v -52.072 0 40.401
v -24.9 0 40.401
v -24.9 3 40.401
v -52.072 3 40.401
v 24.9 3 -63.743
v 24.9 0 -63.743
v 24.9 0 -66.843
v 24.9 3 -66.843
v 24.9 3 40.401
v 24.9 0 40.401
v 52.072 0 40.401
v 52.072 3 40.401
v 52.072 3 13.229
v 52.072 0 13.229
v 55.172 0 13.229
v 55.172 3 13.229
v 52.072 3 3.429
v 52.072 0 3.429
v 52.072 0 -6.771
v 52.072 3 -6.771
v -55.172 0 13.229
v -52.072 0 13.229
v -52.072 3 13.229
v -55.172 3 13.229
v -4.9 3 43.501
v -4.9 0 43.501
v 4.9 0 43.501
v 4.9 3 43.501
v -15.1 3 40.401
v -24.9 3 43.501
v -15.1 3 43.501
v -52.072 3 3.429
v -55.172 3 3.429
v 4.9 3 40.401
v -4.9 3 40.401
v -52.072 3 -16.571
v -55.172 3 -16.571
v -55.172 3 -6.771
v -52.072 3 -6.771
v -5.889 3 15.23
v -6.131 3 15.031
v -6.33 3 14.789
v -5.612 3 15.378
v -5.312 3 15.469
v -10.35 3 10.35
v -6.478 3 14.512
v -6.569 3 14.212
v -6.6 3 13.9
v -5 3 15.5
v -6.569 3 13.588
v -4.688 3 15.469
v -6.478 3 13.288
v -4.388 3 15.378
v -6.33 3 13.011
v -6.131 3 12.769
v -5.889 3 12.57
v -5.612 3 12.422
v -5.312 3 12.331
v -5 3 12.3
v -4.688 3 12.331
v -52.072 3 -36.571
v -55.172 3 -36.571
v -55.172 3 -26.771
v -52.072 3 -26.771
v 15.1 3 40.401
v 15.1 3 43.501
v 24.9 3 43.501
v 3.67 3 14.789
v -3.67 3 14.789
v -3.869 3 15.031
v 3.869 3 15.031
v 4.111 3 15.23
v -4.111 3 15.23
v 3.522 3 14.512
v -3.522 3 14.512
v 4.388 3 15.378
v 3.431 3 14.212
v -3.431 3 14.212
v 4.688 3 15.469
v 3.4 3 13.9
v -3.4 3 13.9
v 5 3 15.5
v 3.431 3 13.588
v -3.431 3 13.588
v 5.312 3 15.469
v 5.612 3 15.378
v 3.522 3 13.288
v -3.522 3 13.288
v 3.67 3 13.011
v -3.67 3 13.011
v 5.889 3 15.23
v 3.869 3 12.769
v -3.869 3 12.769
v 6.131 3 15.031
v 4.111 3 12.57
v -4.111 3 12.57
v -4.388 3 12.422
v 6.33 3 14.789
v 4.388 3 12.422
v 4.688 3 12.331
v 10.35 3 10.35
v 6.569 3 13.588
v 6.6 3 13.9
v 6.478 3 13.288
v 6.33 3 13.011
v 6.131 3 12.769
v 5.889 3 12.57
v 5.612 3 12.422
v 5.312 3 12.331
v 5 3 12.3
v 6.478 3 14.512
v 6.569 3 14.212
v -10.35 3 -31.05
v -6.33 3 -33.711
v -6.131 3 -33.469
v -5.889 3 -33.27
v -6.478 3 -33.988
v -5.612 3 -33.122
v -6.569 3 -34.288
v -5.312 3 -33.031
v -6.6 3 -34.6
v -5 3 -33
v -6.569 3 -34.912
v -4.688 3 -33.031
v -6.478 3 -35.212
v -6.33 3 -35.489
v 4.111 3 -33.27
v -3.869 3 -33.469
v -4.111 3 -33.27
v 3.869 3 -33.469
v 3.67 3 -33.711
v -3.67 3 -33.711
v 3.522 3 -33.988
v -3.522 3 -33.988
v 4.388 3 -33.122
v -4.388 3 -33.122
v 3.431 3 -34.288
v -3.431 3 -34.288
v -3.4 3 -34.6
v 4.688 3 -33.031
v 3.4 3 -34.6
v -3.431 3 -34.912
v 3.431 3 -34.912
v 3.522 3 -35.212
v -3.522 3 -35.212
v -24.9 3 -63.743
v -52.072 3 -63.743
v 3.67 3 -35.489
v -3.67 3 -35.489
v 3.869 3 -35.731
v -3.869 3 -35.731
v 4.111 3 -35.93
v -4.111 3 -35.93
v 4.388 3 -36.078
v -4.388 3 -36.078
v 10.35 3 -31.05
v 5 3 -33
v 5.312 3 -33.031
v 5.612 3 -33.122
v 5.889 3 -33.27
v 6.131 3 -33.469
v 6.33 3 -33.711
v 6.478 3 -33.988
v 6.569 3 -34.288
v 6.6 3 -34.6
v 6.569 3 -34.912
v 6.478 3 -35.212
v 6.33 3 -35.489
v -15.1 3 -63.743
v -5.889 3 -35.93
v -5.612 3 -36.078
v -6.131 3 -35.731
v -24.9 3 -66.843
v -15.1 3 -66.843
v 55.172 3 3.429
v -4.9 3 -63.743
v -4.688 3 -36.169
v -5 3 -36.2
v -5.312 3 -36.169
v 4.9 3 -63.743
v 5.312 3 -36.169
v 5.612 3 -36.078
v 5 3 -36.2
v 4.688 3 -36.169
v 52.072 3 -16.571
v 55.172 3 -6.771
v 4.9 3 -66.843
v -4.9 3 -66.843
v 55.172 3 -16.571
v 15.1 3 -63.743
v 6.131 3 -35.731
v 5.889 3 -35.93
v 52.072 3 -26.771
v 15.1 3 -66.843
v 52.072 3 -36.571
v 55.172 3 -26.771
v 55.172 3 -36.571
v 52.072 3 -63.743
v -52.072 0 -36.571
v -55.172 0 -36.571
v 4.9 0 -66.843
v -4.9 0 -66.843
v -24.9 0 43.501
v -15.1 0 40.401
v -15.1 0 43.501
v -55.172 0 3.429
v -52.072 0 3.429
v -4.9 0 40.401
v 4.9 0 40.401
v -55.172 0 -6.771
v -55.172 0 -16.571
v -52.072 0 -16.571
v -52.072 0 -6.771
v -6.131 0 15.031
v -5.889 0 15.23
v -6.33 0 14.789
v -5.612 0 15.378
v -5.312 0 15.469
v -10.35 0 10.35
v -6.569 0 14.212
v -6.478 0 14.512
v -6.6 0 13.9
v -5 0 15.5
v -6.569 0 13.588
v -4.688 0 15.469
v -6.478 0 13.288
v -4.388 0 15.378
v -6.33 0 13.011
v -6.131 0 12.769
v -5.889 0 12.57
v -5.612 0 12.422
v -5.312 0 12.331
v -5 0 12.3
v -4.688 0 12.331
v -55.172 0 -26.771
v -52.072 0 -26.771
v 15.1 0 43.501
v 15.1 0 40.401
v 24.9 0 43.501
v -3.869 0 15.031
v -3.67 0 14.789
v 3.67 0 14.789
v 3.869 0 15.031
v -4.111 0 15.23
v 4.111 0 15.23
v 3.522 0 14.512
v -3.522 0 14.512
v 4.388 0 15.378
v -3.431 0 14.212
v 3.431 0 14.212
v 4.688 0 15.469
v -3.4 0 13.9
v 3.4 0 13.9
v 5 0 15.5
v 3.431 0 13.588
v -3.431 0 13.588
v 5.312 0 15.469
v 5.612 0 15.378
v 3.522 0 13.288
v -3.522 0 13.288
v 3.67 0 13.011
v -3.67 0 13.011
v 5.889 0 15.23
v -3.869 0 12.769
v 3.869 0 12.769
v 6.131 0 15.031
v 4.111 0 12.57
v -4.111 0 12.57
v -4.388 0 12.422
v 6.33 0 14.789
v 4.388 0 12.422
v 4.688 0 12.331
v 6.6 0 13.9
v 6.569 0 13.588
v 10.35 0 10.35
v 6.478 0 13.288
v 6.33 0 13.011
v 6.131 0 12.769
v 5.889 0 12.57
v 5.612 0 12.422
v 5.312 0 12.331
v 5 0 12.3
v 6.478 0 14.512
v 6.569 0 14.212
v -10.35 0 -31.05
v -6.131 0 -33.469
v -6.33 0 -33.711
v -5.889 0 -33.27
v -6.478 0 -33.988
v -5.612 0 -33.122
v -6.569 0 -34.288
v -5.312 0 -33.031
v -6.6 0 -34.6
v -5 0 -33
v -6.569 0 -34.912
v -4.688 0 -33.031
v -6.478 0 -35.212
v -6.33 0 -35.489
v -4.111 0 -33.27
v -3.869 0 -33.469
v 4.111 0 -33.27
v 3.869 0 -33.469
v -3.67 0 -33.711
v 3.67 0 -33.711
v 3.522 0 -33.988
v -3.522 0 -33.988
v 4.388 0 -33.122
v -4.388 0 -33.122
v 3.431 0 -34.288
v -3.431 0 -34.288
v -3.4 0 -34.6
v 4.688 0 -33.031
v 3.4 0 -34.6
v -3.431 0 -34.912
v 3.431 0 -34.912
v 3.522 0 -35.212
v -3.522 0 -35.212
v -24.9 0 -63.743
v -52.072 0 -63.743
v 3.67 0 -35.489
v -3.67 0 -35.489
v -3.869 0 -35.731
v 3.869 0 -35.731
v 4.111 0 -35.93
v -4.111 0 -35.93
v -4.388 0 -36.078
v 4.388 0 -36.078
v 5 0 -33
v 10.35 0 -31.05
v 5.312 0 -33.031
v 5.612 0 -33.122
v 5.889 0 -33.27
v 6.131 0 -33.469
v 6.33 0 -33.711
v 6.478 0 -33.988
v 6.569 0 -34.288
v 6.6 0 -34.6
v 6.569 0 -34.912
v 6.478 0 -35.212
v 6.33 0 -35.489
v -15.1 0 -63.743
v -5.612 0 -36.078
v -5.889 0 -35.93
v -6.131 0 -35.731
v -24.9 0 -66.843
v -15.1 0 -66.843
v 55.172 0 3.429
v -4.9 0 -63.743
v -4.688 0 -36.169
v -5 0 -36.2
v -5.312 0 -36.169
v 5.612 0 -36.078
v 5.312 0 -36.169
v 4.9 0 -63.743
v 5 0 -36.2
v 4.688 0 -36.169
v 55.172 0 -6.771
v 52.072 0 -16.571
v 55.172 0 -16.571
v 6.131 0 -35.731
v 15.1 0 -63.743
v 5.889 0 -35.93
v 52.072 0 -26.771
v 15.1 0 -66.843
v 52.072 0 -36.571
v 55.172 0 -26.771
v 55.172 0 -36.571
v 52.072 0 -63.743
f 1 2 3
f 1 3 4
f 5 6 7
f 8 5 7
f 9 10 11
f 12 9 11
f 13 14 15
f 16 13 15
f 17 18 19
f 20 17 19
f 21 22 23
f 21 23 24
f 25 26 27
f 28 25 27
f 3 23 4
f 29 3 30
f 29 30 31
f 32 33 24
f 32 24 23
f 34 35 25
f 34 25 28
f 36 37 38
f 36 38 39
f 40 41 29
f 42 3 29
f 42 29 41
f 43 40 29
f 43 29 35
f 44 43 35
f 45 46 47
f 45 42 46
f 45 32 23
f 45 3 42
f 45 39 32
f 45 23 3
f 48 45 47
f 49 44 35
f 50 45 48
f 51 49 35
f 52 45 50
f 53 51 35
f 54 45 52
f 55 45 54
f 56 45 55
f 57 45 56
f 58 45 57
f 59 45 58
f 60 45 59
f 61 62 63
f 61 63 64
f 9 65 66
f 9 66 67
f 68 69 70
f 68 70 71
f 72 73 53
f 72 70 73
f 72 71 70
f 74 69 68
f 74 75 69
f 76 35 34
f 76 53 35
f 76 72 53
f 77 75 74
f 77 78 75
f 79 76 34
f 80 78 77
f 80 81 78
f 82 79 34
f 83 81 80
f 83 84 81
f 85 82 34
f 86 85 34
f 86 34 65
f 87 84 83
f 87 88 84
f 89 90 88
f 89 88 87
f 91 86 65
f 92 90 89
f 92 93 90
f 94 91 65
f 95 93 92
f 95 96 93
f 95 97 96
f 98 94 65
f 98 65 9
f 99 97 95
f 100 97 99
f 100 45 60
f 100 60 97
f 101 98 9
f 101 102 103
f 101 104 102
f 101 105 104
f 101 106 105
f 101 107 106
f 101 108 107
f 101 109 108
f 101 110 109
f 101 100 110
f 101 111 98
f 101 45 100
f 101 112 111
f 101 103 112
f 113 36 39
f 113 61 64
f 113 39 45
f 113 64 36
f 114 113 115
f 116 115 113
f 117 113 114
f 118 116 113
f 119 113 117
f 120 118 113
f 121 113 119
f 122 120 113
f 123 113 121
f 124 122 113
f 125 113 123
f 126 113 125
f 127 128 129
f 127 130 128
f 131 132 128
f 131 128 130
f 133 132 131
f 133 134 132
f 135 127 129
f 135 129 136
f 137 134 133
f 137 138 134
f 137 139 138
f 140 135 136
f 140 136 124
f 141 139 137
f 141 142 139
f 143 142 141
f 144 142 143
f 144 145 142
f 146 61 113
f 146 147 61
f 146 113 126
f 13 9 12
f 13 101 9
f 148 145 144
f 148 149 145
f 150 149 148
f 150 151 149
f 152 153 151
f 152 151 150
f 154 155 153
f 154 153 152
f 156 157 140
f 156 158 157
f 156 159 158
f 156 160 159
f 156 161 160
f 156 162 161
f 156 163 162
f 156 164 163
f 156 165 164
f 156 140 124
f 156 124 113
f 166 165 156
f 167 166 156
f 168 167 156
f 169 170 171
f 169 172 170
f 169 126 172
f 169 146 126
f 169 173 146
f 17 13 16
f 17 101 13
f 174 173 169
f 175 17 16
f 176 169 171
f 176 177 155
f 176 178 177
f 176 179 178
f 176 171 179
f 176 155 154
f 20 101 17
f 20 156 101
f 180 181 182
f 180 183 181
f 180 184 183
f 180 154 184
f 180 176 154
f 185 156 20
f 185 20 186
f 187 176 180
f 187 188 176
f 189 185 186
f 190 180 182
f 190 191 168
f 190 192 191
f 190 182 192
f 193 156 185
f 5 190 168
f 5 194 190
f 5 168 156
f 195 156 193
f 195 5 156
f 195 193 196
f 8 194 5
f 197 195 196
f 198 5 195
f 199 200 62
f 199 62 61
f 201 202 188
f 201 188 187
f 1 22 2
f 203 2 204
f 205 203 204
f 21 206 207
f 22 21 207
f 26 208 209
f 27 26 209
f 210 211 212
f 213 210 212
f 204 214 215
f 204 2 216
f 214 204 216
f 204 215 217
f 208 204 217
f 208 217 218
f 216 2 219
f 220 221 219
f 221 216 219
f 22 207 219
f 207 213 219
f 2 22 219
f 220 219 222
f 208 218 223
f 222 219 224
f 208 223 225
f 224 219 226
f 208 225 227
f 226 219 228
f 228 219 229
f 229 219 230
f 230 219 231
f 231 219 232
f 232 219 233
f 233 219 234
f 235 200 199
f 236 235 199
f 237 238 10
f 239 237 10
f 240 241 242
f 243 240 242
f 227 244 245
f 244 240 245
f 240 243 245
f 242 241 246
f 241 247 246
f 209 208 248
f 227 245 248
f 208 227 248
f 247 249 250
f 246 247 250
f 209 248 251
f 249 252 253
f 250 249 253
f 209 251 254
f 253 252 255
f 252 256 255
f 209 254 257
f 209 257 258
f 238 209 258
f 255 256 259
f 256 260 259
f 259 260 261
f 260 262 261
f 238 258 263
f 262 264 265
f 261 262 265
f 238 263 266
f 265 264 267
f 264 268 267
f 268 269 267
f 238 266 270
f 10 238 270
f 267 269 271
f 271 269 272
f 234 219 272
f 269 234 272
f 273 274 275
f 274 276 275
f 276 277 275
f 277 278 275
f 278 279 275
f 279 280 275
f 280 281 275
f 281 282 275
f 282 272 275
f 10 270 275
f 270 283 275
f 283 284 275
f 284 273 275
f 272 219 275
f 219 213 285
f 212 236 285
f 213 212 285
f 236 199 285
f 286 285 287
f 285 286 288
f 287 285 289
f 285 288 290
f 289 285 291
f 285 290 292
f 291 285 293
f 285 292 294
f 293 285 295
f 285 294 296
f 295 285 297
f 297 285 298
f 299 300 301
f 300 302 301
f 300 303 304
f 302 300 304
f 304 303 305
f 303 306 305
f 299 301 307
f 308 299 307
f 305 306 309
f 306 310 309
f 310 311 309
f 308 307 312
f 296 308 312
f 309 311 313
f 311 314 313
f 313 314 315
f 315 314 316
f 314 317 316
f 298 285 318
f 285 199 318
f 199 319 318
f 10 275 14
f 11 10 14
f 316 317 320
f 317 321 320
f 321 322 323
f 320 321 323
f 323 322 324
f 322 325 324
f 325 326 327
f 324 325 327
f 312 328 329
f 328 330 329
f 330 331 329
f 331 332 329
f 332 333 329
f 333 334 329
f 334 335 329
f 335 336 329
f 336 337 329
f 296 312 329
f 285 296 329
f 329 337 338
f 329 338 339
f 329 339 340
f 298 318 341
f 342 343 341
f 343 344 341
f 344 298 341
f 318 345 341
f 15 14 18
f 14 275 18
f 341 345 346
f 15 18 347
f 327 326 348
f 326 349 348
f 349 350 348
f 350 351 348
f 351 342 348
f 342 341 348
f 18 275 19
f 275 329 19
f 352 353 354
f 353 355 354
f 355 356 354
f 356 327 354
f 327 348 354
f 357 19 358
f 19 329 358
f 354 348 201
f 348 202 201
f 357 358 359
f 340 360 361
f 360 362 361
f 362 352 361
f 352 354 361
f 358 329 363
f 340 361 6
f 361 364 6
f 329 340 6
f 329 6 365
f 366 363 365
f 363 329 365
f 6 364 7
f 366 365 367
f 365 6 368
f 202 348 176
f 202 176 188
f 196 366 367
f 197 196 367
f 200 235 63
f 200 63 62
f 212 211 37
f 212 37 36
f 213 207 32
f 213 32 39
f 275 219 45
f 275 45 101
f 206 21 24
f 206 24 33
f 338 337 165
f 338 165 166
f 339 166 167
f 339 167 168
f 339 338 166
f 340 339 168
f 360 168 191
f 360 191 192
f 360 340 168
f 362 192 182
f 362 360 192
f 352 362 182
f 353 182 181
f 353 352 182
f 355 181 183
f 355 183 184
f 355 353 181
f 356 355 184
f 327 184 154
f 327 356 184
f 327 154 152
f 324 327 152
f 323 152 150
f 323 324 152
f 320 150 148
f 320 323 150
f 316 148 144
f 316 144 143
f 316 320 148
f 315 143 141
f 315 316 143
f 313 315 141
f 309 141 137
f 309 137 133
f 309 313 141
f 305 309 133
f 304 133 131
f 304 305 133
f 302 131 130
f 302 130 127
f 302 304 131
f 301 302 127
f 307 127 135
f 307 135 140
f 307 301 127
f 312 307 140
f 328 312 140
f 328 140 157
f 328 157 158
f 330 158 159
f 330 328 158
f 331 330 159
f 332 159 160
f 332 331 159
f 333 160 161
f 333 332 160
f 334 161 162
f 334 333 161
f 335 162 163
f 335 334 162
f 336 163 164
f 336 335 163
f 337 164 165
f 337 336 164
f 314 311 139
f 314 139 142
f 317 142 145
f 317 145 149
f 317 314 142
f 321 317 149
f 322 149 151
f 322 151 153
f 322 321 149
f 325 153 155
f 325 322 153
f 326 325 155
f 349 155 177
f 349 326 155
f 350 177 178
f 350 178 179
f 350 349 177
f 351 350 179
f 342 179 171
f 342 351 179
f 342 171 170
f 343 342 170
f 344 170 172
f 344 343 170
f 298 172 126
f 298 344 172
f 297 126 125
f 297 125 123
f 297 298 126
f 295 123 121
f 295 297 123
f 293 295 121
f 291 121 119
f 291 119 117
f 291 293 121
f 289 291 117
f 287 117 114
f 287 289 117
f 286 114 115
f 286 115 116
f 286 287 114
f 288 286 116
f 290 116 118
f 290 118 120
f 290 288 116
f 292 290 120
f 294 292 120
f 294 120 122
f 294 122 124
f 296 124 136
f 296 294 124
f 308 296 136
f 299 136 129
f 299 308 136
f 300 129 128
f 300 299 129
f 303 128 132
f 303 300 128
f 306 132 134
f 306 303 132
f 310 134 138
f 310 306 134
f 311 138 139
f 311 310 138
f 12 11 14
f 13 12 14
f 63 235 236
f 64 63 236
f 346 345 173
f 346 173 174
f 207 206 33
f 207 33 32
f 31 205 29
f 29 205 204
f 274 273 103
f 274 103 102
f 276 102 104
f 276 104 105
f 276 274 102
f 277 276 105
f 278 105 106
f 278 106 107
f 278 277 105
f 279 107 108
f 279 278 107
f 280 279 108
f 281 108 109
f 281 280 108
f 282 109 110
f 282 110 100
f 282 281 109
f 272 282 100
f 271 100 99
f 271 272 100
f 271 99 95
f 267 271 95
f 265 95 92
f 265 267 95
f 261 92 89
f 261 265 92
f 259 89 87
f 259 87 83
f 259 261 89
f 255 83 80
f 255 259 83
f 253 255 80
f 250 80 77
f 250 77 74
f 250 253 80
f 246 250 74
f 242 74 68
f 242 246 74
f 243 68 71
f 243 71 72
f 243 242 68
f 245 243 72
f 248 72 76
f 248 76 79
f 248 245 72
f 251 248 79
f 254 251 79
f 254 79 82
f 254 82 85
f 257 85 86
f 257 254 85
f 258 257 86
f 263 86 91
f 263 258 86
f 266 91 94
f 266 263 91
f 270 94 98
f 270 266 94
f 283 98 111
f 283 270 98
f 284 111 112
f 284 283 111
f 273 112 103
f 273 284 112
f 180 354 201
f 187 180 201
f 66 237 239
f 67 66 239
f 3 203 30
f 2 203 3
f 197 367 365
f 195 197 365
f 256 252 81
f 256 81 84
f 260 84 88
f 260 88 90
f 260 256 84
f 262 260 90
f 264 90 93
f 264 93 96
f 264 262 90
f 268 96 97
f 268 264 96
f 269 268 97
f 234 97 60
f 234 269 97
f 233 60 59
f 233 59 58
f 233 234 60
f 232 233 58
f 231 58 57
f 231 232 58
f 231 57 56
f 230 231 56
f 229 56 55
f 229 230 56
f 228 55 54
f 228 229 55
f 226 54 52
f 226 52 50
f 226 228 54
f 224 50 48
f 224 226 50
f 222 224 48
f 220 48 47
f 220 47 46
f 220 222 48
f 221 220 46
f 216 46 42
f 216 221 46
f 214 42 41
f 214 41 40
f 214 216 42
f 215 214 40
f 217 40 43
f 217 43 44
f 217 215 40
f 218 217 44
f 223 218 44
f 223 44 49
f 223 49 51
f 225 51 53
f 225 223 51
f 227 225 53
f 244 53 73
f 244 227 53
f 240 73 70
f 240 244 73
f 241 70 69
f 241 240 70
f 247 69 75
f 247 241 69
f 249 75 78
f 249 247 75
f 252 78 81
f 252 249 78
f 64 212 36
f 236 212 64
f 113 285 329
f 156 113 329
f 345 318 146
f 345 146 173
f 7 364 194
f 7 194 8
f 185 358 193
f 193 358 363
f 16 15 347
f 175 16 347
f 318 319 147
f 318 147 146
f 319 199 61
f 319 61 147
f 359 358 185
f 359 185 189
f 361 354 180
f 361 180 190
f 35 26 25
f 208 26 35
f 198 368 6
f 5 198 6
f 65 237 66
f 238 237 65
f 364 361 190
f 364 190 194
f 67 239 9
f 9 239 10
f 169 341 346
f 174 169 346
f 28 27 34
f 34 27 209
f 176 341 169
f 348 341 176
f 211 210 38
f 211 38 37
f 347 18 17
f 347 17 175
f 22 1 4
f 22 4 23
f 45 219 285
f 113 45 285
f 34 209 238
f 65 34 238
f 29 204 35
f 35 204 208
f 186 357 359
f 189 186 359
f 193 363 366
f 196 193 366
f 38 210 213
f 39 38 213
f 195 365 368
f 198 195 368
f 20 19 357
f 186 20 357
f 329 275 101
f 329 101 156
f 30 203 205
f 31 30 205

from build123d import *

# Parameters (mm, degrees)
SKETCH1_W           = 110.344434204
SKETCH1_H           = 110.344434204
SKETCH1_R           = 1.6
SKETCH1_W_2         = 20.7
SKETCH1_H_2         = 41.4
BOSS_EXTRUDE1_DEPTH = 3
SKETCH3_W           = 10.2
SKETCH3_H           = 3.2
SKETCH3_W_2         = 3.2
SKETCH3_H_2         = 10.2
CUT_EXTRUDE1_DEPTH  = 4


with BuildPart() as part:
    # Sketch1 → Boss-Extrude1 (new body)
    with BuildSketch(Plane(origin=(0, 0, 0), x_dir=(1, 0, 0), z_dir=(0, 1, 0))):
        with Locations((0, 11.670773756)):
            Rectangle(SKETCH1_W, SKETCH1_H)
        with Locations((-5, 34.6)):
            Circle(SKETCH1_R, mode=Mode.SUBTRACT)
        with Locations((5, 34.6)):
            Circle(SKETCH1_R, mode=Mode.SUBTRACT)
        with Locations((5, -13.9)):
            Circle(SKETCH1_R, mode=Mode.SUBTRACT)
        with Locations((-5, -13.9)):
            Circle(SKETCH1_R, mode=Mode.SUBTRACT)
        with Locations((0, 10.35)):
            Rectangle(SKETCH1_W_2, SKETCH1_H_2, mode=Mode.SUBTRACT)
    extrude(amount=BOSS_EXTRUDE1_DEPTH)

    # Sketch3 → Cut-Extrude1 (cut, through all)
    with BuildSketch(Plane(origin=(0, 0, 0), x_dir=(1, 0, 0), z_dir=(0, 1, 0))):
        with Locations((10, 65.342990858)):
            Rectangle(SKETCH3_W, SKETCH3_H)
        Polygon((24.9, 66.942990858), (55.272217102, 66.942990858), (55.272217102, 36.570773756), (52.072217102, 36.570773756), (52.072217102, 63.742990858), (24.9, 63.742990858), align=None)
        with Locations((53.672217102, 21.670773756)):
            Rectangle(SKETCH3_W_2, SKETCH3_H_2)
        Polygon((24.9, -40.401443346), (52.072217102, -40.401443346), (52.072217102, -13.229226244), (55.272217102, -13.229226244), (55.272217102, -43.601443346), (24.9, -43.601443346), align=None)
        with Locations((53.672217102, 1.670773756)):
            Rectangle(SKETCH3_W_2, SKETCH3_H_2)
        Polygon((-52.072217102, -13.229226244), (-55.272217102, -13.229226244), (-55.272217102, -43.601443346), (-24.9, -43.601443346), (-24.9, -40.401443346), (-52.072217102, -40.401443346), align=None)
        with Locations((-53.672217102, 21.670773756)):
            Rectangle(SKETCH3_W_2, SKETCH3_H_2)
        with Locations((-10, 65.342990858)):
            Rectangle(SKETCH3_W, SKETCH3_H)
        Polygon((-55.272217102, 36.570773756), (-52.072217102, 36.570773756), (-52.072217102, 63.742990858), (-24.9, 63.742990858), (-24.9, 66.942990858), (-55.272217102, 66.942990858), align=None)
        with Locations((-53.672217102, 1.670773756)):
            Rectangle(SKETCH3_W_2, SKETCH3_H_2)
        with Locations((-10, -42.001443346)):
            Rectangle(SKETCH3_W, SKETCH3_H)
        with Locations((10, -42.001443346)):
            Rectangle(SKETCH3_W, SKETCH3_H)
    extrude(amount=CUT_EXTRUDE1_DEPTH, mode=Mode.SUBTRACT)


solid = part.part
